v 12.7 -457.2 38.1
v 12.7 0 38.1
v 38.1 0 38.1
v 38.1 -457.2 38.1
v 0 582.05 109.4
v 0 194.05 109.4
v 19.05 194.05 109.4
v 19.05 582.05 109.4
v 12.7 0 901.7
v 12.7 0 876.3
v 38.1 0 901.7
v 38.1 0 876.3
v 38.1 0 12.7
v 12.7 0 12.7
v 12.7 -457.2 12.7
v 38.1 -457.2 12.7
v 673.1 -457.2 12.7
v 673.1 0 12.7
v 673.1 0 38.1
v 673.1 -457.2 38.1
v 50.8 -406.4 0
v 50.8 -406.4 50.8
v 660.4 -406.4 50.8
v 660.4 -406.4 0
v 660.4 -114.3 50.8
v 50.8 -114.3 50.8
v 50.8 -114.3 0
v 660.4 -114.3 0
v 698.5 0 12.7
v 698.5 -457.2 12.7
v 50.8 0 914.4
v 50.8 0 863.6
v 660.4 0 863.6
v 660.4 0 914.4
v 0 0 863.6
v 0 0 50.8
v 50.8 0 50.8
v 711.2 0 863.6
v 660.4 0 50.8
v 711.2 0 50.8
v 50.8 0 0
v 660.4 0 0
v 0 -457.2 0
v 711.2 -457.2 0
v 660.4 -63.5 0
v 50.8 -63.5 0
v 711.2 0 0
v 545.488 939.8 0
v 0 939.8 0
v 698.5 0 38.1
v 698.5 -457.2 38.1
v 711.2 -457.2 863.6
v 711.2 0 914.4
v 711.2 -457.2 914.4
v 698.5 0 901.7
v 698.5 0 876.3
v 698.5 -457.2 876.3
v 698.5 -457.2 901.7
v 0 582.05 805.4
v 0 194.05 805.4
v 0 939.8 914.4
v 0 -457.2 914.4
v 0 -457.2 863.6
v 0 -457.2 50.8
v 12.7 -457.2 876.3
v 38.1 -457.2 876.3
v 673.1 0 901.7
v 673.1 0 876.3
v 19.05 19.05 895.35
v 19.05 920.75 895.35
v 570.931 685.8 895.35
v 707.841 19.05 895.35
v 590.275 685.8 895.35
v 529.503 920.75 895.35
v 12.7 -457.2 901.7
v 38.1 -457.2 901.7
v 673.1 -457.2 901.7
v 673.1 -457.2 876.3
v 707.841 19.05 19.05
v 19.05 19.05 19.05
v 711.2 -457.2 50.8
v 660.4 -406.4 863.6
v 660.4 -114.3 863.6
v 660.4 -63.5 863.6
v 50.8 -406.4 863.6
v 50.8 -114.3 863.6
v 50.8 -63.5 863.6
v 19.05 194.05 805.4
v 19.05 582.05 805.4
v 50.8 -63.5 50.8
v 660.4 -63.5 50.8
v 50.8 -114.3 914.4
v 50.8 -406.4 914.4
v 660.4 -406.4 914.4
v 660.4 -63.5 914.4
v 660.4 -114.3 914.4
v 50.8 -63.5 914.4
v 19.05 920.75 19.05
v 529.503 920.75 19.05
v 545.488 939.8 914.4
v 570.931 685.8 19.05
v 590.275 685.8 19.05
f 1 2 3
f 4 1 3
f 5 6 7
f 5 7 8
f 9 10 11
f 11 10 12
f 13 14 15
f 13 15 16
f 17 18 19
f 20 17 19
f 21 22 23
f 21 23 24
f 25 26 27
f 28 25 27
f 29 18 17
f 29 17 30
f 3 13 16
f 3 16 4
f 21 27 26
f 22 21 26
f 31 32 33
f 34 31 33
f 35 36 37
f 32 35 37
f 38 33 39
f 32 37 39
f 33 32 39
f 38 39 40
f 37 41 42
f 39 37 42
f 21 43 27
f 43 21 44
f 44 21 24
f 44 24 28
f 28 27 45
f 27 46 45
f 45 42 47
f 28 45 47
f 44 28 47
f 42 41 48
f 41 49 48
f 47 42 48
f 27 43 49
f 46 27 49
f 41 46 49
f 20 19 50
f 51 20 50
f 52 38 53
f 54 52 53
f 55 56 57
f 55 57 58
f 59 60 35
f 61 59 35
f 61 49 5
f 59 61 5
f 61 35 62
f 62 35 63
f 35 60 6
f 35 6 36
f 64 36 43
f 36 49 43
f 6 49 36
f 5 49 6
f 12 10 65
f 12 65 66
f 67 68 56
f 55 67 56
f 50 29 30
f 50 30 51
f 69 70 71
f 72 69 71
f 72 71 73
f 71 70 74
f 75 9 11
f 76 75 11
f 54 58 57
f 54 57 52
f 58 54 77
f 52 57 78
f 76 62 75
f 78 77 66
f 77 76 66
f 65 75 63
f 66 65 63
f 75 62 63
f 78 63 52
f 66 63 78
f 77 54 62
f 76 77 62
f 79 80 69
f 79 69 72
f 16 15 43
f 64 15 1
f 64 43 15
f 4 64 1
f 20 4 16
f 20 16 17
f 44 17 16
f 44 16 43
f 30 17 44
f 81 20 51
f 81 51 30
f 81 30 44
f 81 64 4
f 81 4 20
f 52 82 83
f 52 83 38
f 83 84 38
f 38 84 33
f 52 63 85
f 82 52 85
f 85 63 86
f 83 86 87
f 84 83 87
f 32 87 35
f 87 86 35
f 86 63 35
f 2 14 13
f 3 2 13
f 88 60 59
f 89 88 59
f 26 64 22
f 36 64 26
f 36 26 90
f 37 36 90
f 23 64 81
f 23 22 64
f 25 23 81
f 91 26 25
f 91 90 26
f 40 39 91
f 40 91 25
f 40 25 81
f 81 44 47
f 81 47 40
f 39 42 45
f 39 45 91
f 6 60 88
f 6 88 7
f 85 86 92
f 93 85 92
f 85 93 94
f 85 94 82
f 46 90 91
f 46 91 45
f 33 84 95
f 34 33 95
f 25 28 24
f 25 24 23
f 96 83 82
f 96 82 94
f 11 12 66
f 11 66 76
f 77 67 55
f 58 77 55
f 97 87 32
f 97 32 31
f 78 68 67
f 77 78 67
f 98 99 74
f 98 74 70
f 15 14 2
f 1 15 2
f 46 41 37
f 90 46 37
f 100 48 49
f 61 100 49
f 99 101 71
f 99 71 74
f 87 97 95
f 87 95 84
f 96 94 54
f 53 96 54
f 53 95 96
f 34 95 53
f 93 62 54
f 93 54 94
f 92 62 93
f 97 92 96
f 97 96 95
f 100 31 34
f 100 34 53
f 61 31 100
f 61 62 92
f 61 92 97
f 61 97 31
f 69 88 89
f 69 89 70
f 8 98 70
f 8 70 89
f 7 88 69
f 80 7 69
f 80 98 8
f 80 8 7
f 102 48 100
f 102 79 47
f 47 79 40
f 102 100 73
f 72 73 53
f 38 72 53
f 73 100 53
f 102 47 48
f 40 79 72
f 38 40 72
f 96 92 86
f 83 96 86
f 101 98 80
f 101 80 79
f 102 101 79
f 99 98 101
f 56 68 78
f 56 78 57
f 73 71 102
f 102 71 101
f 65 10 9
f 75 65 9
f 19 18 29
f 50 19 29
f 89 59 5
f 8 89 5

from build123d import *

# Parameters (mm, degrees)
BOSS_EXTRUDE1_DEPTH     = 914.4
SHELL1_T                = -19.05
BOSS_EXTRUDE2_REACH     = 1484.708
SKETCH2_W               = 876.3
SKETCH2_H               = 234.95
SHELL2_START            = 19.05
SHELL2_DEPTH            = 876.3
SKETCH6_W               = 50.8
SKETCH6_H               = 50.8
SKETCH6_W_2             = 25.4
SKETCH6_H_2             = 25.4
BOSS_EXTRUDE3_DEPTH     = 457.2
SKETCH7_W               = 50.8
SKETCH7_H               = 50.8
BOSS_EXTRUDE4_DEPTH     = 609.6
CUT_EXTRUDE2_DEPTH      = 1483.708003115
CUT_EXTRUDE2_DEPTH_BACK = 1483.708003115
SKETCH9_W               = 696
SKETCH9_H               = 388


# Read off the part's stored shape, not the designer's step: Shell2
with BuildPart() as part:
    # Sketch1 → Boss-Extrude1 (new body)
    with BuildSketch(Plane.XY):
        Polygon((0, 0), (711.2, 0), (545.48790353, 939.8), (0, 939.8), align=None)
    extrude(amount=BOSS_EXTRUDE1_DEPTH)

    # Shell1
    shell1_openings = [part.faces().sort_by_distance(p)[0] for p in [
        (628.343951765, 469.9, 457.2),
    ]]
    offset(amount=SHELL1_T, openings=shell1_openings, kind=Kind.INTERSECTION)

    # Boss-Extrude2: up to this plane
    boss_extrude2_end = Plane(origin=(711.2, 0, 914.4), z_dir=(-0.9848077530122075, -0.1736481776669338, 0))
    # Sketch2 → Boss-Extrude2 (add, up to the surface)
    with BuildSketch(Plane(origin=(19.05, 0, 0), x_dir=(0, 0, -1), z_dir=(1, 0, 0)), mode=Mode.PRIVATE) as boss_extrude2_sk1:
        with Locations((-457.2, 803.275)):
            Rectangle(SKETCH2_W, SKETCH2_H)
    boss_extrude2_tool1 = split(extrude(boss_extrude2_sk1.sketch, amount=BOSS_EXTRUDE2_REACH, mode=Mode.PRIVATE), bisect_by=boss_extrude2_end, keep=Keep.BOTH, mode=Mode.PRIVATE)
    add(boss_extrude2_tool1.solids().sort_by_distance((19.05, 803.275, 457.2))[0])

    # Shell2 outline → Shell2 (cut)
    with BuildSketch(Plane.XY.offset(SHELL2_START)):
        Polygon((19.05, 920.75), (19.05, 685.8), (570.931079674, 685.8), (529.503055556, 920.75), align=None)
    extrude(amount=SHELL2_DEPTH, mode=Mode.SUBTRACT)

    # Sketch6 → Boss-Extrude3 (add)
    # profile 1 of 4: a face of its own
    with BuildSketch(Plane.XZ):
        with Locations((685.8, 889)):
            Rectangle(SKETCH6_W, SKETCH6_H)
        with Locations((685.8, 889)):
            Rectangle(SKETCH6_W_2, SKETCH6_H_2, mode=Mode.SUBTRACT)
    # profile 2 of 4: a face of its own
    with BuildSketch(Plane.XZ):
        with Locations((685.8, 25.4)):
            Rectangle(SKETCH6_W, SKETCH6_H)
        with Locations((685.8, 25.4)):
            Rectangle(SKETCH6_W_2, SKETCH6_H_2, mode=Mode.SUBTRACT)
    # profile 3 of 4: a face of its own
    with BuildSketch(Plane.XZ):
        with Locations((25.4, 25.4)):
            Rectangle(SKETCH6_W, SKETCH6_H)
        with Locations((25.4, 25.4)):
            Rectangle(SKETCH6_W_2, SKETCH6_H_2, mode=Mode.SUBTRACT)
    # profile 4 of 4: a face of its own
    with BuildSketch(Plane.XZ):
        with Locations((25.4, 889)):
            Rectangle(SKETCH6_W, SKETCH6_H)
        with Locations((25.4, 889)):
            Rectangle(SKETCH6_W_2, SKETCH6_H_2, mode=Mode.SUBTRACT)
    extrude(amount=BOSS_EXTRUDE3_DEPTH)

    # Sketch7 → Boss-Extrude4 (add)
    with BuildSketch(Plane(origin=(50.8, 0, 0), x_dir=(0, 0, -1), z_dir=(1, 0, 0))):
        with Locations((-889, -431.8)):
            Rectangle(SKETCH7_W, SKETCH7_H)
        with Locations((-25.4, -431.8)):
            Rectangle(SKETCH7_W, SKETCH7_H)
        with Locations((-889, -88.9)):
            Rectangle(SKETCH7_W, SKETCH7_H)
        with Locations((-25.4, -88.9)):
            Rectangle(SKETCH7_W, SKETCH7_H)
    extrude(amount=BOSS_EXTRUDE4_DEPTH)

    # Sketch9 → Cut-Extrude2 (cut, two sides: drawn at the far end of the back side and taken through both)
    with BuildSketch(Plane(origin=(19.05, 0, 0), x_dir=(0, 0, -1), z_dir=(1, 0, 0)).offset(-CUT_EXTRUDE2_DEPTH_BACK)):
        with Locations((-457.4, 388.05)):
            Rectangle(SKETCH9_W, SKETCH9_H)
    extrude(amount=CUT_EXTRUDE2_DEPTH + CUT_EXTRUDE2_DEPTH_BACK, mode=Mode.SUBTRACT)


solid = part.part
